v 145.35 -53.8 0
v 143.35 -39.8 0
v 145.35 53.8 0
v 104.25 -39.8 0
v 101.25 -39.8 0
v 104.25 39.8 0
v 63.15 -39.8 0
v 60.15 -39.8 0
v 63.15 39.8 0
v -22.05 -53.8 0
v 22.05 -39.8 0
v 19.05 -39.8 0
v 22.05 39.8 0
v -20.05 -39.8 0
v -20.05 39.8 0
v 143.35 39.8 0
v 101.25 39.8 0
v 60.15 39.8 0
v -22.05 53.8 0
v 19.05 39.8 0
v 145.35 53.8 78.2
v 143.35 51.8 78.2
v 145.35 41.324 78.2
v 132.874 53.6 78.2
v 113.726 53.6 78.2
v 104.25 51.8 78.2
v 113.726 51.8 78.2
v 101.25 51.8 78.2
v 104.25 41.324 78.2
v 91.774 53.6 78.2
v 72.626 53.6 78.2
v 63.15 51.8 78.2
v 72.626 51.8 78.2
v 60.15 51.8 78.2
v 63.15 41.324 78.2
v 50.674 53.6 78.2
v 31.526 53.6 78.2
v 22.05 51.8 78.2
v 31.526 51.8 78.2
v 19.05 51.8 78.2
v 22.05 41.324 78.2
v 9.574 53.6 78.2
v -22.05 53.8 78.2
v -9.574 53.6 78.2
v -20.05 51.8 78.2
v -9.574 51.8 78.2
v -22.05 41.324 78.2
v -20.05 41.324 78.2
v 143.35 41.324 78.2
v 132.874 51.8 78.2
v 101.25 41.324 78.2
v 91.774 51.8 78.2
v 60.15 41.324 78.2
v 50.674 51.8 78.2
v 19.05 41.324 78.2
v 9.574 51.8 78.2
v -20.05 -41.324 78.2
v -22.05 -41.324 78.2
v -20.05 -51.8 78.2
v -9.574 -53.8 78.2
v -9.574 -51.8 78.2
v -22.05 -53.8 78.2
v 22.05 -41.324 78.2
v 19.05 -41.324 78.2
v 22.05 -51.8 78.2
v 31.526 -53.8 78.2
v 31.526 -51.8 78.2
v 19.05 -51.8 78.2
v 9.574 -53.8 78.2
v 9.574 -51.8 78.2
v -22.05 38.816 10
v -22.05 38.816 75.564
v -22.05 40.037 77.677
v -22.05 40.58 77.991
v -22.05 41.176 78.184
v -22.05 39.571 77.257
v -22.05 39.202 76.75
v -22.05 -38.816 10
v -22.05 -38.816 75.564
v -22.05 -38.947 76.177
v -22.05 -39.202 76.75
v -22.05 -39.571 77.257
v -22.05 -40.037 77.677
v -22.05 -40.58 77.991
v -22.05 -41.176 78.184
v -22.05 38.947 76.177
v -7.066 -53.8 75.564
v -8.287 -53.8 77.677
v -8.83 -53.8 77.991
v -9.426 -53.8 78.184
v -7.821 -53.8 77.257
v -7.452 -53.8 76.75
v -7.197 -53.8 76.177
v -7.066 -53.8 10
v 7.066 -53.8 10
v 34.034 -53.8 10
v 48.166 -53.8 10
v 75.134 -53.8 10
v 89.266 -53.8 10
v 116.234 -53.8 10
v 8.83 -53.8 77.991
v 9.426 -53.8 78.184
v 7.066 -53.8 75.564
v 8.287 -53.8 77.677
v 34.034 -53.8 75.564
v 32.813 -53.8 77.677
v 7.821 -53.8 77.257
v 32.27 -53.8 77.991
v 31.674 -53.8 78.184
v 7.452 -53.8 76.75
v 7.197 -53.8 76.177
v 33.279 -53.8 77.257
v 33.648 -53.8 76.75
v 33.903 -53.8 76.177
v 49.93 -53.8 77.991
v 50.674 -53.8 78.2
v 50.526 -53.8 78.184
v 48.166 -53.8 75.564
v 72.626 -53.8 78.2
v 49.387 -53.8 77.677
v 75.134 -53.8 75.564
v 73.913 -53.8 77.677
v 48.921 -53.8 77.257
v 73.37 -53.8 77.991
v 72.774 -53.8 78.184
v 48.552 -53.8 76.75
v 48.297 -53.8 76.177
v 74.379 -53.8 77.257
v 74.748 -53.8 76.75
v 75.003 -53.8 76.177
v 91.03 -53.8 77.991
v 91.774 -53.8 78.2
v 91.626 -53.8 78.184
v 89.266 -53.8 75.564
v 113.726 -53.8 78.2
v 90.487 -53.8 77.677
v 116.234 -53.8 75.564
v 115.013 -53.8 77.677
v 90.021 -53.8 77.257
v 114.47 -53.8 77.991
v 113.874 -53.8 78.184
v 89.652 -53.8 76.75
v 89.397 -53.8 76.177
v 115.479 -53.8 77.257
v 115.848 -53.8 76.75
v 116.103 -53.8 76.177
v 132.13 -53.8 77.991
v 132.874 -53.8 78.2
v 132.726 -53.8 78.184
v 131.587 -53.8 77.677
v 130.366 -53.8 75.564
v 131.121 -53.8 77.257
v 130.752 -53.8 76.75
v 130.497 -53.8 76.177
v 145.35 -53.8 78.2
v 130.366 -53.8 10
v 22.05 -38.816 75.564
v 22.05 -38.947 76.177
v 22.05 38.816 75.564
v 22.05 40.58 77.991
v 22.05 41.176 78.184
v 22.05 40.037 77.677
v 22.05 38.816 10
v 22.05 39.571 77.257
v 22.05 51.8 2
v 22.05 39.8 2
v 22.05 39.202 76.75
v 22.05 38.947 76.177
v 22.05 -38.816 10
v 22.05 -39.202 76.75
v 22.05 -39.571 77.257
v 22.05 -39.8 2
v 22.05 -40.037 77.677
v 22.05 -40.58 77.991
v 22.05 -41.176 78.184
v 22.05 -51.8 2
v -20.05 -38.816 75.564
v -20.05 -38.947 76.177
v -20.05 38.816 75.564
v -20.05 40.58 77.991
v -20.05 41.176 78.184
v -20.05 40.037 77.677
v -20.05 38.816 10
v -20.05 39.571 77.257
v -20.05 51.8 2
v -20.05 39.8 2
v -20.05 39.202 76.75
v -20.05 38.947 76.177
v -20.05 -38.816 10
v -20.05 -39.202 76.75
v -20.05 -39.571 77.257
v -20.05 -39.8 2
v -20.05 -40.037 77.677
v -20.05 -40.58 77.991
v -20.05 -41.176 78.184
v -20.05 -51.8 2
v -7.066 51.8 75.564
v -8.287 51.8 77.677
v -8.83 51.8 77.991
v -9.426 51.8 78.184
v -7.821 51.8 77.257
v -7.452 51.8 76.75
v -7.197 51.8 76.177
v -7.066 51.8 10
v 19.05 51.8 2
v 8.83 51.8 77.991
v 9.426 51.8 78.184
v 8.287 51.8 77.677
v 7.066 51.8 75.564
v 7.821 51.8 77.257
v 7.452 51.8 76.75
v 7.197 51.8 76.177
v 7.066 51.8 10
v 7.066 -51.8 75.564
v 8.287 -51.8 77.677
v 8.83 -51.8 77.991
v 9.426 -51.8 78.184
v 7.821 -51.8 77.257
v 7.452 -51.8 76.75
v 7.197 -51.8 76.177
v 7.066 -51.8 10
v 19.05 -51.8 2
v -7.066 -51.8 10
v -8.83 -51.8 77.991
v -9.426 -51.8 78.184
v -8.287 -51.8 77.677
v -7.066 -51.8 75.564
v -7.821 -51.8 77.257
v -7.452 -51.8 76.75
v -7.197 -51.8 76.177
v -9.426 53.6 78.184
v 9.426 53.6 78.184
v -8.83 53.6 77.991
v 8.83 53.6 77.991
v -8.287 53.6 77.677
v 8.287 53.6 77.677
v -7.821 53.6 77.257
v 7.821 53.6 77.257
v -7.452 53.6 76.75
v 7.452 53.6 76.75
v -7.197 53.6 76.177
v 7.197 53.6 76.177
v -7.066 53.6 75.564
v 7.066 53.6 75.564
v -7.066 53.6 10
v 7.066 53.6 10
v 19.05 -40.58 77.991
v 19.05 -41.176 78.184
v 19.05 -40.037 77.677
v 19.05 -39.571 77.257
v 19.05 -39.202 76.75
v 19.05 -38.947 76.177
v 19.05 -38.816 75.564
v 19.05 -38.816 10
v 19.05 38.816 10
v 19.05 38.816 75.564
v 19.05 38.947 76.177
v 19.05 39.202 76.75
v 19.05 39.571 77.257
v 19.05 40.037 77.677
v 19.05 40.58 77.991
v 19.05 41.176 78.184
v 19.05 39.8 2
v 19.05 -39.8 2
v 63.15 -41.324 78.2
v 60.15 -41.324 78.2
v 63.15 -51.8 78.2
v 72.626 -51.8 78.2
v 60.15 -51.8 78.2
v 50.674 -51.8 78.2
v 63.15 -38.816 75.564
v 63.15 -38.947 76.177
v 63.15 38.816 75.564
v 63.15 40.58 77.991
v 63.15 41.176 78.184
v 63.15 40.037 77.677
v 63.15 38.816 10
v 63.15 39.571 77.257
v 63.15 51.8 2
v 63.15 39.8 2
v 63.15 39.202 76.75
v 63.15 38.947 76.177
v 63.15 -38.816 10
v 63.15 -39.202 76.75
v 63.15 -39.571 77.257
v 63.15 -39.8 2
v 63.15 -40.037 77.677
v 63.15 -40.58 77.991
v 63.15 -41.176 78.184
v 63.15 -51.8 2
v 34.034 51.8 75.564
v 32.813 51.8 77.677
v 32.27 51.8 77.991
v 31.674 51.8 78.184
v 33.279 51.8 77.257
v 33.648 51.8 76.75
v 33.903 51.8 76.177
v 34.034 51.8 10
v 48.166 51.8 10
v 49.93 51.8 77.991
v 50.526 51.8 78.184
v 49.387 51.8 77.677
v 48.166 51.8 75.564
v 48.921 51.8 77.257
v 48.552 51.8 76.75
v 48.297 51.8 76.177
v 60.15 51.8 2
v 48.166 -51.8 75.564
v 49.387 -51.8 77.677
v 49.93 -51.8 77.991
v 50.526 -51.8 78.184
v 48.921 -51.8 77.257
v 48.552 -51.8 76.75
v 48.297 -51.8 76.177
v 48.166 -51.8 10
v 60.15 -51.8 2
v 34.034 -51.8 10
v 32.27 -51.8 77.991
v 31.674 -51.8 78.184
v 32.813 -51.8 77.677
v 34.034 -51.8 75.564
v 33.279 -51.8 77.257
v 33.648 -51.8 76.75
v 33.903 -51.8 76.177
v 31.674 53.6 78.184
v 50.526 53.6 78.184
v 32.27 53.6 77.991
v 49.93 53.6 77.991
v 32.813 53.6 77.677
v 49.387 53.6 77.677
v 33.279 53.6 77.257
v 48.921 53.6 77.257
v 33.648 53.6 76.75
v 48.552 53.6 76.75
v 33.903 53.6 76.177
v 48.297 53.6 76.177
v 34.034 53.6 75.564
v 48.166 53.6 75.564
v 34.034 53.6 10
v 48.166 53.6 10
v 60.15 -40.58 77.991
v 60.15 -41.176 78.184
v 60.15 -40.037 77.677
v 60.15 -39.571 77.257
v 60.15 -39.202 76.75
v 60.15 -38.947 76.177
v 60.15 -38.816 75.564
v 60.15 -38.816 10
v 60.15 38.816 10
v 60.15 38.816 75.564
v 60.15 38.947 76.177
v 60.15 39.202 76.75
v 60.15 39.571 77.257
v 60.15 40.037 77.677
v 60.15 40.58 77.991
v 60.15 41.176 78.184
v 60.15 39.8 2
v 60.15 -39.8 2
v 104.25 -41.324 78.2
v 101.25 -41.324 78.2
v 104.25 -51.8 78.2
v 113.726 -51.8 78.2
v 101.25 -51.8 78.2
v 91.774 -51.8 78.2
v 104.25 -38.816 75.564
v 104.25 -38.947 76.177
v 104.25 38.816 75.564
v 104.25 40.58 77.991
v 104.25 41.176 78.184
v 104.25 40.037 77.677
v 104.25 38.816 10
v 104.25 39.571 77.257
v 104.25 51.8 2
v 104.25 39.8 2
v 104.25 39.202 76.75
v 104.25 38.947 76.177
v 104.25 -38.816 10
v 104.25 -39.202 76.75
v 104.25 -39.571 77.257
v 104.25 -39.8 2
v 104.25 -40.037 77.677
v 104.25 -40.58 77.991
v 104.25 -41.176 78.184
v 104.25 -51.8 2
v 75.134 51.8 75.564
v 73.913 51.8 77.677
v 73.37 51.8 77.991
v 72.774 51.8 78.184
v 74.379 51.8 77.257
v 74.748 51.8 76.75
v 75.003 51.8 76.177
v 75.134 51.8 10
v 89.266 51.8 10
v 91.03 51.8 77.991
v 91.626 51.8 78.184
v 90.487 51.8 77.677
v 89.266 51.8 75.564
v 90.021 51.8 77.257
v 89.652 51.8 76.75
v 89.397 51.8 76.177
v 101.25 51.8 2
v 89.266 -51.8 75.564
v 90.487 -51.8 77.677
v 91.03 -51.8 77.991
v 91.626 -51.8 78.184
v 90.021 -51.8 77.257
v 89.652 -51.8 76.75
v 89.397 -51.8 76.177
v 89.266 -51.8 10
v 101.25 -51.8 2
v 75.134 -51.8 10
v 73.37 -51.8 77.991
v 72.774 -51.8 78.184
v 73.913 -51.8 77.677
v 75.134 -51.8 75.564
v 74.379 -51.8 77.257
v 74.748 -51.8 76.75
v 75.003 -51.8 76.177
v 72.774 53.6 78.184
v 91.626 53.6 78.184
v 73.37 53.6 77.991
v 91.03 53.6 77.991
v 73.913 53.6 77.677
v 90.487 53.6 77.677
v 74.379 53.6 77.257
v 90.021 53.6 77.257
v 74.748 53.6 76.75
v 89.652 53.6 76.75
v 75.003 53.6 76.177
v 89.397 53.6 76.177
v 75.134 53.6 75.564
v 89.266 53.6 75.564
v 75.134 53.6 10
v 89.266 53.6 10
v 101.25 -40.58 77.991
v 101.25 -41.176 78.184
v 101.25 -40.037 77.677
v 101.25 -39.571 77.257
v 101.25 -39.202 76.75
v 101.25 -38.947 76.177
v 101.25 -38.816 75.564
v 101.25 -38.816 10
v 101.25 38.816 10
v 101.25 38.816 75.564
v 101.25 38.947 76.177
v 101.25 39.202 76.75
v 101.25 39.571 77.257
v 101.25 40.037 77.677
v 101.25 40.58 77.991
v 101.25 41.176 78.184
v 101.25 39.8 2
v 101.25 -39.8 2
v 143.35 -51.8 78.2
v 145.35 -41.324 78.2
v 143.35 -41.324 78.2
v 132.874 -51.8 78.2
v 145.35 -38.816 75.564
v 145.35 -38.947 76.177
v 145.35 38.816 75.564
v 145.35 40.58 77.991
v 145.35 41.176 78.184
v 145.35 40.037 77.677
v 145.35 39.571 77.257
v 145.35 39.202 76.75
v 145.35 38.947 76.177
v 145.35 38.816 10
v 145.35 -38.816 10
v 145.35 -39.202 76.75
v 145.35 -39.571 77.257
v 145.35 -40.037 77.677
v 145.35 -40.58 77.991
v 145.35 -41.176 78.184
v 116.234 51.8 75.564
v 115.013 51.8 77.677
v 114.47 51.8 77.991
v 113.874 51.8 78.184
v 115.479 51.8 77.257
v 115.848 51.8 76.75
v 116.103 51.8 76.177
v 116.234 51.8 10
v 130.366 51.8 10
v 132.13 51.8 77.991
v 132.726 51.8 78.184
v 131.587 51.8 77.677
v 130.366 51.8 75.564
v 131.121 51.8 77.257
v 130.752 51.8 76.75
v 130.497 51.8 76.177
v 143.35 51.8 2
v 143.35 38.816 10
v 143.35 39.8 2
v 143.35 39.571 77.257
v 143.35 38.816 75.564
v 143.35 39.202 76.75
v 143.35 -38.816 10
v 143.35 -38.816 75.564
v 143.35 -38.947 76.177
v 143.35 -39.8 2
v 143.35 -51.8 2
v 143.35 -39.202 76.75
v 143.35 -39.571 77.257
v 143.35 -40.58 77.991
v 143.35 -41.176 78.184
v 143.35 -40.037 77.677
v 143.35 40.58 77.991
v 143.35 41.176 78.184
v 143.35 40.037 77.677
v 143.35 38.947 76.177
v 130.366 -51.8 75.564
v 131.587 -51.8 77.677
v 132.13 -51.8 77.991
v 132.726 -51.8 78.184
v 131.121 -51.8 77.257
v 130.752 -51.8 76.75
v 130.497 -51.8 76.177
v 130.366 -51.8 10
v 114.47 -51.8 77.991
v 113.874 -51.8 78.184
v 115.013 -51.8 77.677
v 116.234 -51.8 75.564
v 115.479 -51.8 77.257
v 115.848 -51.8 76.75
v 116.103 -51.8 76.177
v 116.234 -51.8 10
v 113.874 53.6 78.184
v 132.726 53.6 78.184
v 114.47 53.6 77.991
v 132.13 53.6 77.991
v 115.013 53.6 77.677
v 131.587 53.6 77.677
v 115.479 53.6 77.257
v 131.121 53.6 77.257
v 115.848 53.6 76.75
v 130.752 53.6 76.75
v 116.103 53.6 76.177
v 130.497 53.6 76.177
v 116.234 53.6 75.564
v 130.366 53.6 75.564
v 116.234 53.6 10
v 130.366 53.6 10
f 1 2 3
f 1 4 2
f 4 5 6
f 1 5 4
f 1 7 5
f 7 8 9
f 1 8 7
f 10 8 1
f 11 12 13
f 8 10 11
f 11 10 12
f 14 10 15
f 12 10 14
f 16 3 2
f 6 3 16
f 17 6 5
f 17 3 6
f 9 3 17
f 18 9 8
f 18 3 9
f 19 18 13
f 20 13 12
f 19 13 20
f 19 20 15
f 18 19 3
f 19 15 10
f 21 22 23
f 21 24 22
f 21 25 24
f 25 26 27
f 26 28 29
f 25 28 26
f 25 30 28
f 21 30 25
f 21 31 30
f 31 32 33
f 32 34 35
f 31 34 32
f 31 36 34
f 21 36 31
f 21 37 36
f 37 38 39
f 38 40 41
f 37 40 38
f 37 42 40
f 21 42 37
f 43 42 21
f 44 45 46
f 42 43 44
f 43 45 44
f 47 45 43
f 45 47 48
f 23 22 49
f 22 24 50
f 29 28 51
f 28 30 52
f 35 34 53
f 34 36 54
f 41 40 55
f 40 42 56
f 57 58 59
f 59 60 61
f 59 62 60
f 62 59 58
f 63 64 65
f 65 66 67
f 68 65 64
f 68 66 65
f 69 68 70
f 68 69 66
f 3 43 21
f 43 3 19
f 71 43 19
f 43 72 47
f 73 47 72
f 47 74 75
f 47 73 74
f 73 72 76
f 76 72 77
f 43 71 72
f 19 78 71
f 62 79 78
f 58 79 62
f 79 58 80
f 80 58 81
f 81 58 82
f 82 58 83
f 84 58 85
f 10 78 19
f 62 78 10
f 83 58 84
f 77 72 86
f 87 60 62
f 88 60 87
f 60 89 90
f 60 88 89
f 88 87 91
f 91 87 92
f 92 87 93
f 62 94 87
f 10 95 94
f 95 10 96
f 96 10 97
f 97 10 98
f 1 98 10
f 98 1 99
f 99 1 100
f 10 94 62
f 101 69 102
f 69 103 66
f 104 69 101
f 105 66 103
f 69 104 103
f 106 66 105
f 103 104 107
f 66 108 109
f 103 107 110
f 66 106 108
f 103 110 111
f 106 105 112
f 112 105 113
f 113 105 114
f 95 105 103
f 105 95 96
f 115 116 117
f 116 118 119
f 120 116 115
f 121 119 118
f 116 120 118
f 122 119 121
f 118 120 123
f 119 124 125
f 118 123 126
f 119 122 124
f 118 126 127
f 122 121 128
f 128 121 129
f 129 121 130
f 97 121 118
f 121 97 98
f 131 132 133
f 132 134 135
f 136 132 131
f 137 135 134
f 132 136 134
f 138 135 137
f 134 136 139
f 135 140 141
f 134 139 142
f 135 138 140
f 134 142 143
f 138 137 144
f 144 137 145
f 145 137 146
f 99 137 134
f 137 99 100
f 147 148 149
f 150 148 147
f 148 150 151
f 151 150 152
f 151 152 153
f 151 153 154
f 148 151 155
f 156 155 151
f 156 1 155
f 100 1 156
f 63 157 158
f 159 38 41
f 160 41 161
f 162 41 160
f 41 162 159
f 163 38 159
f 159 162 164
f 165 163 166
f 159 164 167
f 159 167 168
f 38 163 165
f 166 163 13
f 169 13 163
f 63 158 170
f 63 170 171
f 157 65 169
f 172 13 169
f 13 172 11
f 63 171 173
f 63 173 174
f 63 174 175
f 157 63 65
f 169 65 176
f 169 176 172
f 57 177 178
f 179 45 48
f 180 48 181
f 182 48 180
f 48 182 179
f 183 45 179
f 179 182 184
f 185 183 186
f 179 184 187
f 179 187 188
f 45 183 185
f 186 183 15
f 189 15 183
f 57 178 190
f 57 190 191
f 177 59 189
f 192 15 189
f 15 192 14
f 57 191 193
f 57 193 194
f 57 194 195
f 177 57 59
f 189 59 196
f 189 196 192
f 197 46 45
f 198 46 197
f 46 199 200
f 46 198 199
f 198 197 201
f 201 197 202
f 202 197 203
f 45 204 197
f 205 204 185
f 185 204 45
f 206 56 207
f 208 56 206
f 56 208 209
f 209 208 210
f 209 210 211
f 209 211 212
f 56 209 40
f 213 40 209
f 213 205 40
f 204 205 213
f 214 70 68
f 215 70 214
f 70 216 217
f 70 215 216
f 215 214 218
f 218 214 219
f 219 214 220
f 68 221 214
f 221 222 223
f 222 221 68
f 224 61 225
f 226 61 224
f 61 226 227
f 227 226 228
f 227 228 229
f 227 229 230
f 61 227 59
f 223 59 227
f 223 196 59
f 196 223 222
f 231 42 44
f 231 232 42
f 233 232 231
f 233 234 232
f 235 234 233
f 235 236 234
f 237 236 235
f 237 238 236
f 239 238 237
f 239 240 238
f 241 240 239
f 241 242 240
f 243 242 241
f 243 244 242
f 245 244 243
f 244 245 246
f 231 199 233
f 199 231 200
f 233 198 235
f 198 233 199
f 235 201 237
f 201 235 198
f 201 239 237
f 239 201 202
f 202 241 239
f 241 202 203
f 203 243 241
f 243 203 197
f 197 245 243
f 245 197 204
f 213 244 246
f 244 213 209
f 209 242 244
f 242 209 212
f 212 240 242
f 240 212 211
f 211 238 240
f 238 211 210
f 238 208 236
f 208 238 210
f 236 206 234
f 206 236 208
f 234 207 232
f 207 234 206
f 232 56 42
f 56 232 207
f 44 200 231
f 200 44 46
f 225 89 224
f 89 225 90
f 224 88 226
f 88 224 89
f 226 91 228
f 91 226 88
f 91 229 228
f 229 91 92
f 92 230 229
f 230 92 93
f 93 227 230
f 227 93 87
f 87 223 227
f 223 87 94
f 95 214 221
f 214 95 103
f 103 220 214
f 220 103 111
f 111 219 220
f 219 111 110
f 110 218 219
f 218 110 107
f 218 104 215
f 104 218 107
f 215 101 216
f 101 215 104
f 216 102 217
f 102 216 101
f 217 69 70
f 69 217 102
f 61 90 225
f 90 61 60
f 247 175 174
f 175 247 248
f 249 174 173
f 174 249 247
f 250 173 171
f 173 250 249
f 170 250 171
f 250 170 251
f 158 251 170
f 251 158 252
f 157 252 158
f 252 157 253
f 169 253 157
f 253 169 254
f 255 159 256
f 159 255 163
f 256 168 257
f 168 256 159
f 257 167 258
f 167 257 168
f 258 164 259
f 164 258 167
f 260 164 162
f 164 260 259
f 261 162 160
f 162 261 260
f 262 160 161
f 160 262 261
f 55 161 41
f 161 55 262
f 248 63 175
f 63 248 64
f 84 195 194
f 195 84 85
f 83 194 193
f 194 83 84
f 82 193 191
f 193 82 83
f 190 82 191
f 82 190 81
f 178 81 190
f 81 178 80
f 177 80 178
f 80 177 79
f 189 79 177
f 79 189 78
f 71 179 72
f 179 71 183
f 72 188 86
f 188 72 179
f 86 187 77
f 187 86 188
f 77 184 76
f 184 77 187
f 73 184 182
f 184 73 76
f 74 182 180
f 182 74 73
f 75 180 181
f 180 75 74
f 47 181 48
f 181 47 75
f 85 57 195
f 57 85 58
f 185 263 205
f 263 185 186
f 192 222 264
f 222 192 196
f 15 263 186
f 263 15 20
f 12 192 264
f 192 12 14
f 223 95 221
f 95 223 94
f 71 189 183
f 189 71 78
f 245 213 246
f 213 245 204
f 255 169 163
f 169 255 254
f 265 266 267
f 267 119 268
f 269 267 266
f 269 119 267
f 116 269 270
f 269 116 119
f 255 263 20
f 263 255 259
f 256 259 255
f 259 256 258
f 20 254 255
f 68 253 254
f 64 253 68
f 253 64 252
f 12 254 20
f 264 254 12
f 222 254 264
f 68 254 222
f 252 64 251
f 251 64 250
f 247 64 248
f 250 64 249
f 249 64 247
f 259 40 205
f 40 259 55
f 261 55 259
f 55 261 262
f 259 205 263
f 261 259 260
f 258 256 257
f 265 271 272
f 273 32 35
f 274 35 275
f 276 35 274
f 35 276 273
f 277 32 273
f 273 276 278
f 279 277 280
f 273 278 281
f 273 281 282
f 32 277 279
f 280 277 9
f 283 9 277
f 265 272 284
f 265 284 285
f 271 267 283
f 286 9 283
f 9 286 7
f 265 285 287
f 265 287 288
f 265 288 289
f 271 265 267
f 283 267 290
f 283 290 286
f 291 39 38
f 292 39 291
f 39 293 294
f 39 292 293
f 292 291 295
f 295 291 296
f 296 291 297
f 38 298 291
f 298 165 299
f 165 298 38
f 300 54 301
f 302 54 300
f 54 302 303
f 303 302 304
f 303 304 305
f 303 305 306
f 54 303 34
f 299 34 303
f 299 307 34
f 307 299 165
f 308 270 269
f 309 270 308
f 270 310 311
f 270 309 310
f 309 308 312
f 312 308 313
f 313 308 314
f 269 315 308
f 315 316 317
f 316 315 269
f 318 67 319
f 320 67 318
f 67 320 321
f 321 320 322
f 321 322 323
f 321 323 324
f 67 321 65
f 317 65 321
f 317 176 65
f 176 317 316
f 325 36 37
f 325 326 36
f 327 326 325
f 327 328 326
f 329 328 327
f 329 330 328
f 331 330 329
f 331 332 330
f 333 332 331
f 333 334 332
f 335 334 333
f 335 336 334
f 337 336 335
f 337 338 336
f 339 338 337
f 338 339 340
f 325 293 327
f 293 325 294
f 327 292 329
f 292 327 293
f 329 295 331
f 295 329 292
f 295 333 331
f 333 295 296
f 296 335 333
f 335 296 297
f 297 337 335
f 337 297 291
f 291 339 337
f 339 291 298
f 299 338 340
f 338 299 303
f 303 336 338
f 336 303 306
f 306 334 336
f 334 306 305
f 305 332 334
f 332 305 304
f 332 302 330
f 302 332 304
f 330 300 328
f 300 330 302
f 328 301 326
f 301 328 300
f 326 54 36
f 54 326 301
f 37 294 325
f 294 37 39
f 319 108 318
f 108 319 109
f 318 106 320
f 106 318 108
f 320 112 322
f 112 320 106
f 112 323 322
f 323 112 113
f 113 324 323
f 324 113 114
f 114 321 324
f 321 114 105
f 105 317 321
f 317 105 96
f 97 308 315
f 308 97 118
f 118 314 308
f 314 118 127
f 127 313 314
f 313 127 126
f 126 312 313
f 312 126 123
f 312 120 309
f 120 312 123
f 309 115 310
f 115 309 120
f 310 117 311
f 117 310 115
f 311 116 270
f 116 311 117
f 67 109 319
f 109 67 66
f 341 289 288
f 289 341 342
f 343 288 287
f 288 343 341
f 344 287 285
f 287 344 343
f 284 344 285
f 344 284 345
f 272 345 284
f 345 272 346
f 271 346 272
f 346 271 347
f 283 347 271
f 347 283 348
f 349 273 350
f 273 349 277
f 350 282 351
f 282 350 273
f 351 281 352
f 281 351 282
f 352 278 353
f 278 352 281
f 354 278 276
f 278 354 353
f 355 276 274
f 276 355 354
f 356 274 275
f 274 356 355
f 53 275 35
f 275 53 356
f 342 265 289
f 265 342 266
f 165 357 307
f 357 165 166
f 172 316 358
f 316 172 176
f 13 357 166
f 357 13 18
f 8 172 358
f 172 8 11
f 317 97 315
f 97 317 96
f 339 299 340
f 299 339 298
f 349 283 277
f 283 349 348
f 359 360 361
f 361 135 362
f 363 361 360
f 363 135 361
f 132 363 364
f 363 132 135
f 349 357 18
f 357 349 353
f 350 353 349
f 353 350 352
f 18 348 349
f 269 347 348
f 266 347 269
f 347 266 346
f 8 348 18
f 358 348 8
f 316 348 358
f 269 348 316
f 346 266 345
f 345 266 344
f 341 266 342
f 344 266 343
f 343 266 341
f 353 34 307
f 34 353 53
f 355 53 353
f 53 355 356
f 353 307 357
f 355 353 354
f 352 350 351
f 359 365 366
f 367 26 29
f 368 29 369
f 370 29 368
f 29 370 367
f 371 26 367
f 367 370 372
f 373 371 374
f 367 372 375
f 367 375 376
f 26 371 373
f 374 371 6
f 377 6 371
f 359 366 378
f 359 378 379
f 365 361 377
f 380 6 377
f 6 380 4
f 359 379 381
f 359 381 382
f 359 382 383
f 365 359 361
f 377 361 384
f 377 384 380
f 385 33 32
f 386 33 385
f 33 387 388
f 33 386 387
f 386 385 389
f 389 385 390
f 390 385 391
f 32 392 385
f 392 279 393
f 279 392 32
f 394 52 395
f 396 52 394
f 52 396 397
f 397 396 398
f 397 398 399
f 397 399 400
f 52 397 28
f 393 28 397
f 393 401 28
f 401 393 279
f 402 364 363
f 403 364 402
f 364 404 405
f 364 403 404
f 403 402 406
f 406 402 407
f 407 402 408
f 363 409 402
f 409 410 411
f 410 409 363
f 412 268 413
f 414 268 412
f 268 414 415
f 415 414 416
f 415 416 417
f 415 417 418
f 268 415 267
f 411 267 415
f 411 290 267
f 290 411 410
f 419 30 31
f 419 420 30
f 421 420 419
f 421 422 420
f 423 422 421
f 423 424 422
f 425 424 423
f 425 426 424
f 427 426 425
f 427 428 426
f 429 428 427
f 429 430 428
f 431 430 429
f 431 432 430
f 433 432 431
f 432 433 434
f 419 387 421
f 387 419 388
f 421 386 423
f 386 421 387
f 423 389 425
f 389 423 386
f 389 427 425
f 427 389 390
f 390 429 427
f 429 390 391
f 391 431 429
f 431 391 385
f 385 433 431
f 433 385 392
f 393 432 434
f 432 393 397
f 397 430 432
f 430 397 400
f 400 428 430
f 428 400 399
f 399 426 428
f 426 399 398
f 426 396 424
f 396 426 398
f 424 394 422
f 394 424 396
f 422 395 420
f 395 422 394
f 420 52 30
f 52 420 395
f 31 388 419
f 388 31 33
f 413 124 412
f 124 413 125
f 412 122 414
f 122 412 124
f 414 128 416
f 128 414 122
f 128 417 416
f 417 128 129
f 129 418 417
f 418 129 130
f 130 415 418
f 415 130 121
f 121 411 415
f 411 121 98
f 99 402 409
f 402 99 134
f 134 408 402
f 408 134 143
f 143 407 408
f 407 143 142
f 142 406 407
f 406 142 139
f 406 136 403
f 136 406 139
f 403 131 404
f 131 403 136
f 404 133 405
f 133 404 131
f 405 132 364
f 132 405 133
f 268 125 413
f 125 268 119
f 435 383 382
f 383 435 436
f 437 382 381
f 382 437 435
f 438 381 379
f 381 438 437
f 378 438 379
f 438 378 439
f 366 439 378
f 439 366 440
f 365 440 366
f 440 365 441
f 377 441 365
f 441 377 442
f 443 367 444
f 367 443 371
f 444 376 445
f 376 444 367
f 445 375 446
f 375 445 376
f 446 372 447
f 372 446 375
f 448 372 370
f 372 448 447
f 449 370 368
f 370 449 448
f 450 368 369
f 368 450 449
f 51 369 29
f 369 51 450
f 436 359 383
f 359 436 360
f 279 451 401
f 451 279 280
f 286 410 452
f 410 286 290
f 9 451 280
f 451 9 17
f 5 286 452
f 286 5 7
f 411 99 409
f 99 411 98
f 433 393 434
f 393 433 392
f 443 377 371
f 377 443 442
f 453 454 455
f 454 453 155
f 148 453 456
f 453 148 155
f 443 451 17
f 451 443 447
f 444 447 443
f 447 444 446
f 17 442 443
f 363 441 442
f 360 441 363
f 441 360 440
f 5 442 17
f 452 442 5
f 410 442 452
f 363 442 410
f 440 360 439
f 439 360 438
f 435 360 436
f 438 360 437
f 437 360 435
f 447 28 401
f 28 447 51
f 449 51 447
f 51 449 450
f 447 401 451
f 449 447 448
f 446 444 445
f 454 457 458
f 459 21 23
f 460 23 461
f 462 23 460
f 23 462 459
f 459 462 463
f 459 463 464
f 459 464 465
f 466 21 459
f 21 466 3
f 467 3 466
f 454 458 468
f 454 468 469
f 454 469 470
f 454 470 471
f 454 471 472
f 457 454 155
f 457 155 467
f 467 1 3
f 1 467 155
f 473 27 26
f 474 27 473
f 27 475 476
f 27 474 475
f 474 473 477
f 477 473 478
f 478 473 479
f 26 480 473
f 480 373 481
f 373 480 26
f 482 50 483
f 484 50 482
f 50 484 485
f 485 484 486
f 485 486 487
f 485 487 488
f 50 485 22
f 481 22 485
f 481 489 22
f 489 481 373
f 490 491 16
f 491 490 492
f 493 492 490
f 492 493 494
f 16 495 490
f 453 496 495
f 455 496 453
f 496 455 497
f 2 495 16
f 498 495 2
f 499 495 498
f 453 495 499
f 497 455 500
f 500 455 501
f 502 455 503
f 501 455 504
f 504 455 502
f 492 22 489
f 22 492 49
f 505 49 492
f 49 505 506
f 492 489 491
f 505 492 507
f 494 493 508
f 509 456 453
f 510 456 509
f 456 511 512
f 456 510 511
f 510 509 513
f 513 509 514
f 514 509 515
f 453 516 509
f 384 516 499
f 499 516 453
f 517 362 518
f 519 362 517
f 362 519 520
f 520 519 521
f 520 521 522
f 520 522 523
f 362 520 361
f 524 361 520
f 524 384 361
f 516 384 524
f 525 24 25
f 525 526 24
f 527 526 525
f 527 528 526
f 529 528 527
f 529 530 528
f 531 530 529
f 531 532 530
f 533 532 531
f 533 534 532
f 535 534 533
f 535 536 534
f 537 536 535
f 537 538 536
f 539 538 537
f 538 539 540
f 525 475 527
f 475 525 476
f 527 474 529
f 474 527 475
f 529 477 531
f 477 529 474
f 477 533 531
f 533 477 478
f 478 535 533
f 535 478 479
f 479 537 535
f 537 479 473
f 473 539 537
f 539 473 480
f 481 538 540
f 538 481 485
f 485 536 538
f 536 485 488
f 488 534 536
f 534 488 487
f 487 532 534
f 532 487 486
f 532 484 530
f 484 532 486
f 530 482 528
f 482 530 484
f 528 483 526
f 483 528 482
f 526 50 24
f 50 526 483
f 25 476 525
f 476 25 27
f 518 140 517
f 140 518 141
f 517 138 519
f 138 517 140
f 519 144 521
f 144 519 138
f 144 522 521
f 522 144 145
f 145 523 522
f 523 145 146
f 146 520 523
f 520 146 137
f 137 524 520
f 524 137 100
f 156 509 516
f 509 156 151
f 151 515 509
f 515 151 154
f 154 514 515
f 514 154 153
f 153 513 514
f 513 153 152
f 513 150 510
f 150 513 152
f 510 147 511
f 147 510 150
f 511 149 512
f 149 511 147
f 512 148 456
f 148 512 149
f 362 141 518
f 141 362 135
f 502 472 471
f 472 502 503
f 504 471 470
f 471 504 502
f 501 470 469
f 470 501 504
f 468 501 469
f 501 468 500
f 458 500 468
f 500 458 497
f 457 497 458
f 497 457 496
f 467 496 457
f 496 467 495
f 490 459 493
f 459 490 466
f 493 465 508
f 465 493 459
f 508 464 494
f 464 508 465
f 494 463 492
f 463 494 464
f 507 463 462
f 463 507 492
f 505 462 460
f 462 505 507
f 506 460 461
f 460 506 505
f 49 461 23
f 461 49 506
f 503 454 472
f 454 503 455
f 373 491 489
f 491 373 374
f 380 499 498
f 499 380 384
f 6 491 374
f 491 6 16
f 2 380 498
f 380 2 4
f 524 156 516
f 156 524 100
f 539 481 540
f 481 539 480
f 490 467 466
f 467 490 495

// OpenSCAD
// file: ../common/roundedrectdiff.scad
// This creates a square with inverted rounded edges
// usually for subtracting from something else to give that
// object some rounded corners
module rounded_subtraction_square(height, width, radius, segments = 30)
{
    union()
    {
        // base
        square(size = [ height, width ], center = true);

        // right (y+)
        intersection()
        {

            translate([ 0, (width / 2) + (radius / 2), 0 ])
            {
                square(size = [ height, radius ], center = true);
            }

            difference()
            {
                translate([ 0, (width / 2) + radius, 0 ])
                {
                    square(size = [ height, radius * 2 ], center = true);
                }
                hull()
                {
                    translate([ (height / 2) - radius, (width / 2) + radius, 0 ])
                    {
                        circle(r = radius, $fn = segments);
                    }
                    translate([ -((height / 2) - radius), (width / 2) + radius, 0 ])
                    {
                        circle(r = radius, $fn = segments);
                    }
                }
            }
        }

        // left (y-)
        intersection()
        {

            translate([ 0, -((width / 2) + (radius / 2)), 0 ])
            {
                square(size = [ height, radius ], center = true);
            }

            difference()
            {
                translate([ 0, -((width / 2) + radius), 0 ])
                {
                    square(size = [ height, radius * 2 ], center = true);
                }
                hull()
                {
                    translate([ (height / 2) - radius, -((width / 2) + radius), 0 ])
                    {
                        circle(r = radius, $fn = segments);
                    }
                    translate([ -((height / 2) - radius), -((width / 2) + radius), 0 ])
                    {
                        circle(r = radius, $fn = segments);
                    }
                }
            }
        }
    }
}

module rounded_subtraction_square_top(height, width, radius, segments = 30)
{
    union()
    {
        // base
        square(size = [ height, width ], center = true);

        // right (y+)
        intersection()
        {

            translate([ 0, (width / 2) + (radius / 2), 0 ])
            {
                square(size = [ height, radius ], center = true);
            }

            difference()
            {
                translate([ 0, (width / 2) + radius, 0 ])
                {
                    square(size = [ height, radius * 2 ], center = true);
                }
                hull()
                {
                    translate([ (height / 2) - radius, (width / 2) + radius, 0 ])
                    {
                        circle(r = radius, $fn = segments);
                    }
                    translate([ -((height / 2) - radius) * 2, (width / 2) + radius, 0 ])
                    {
                        circle(r = radius, $fn = segments);
                    }
                }
            }
        }

        // left (y-)
        intersection()
        {

            translate([ 0, -((width / 2) + (radius / 2)), 0 ])
            {
                square(size = [ height, radius ], center = true);
            }

            difference()
            {
                translate([ 0, -((width / 2) + radius), 0 ])
                {
                    square(size = [ height, radius * 2 ], center = true);
                }
                hull()
                {
                    translate([ (height / 2) - radius, -((width / 2) + radius), 0 ])
                    {
                        circle(r = radius, $fn = segments);
                    }
                    translate([ -((height / 2) - radius) * 2, -((width / 2) + radius), 0 ])
                    {
                        circle(r = radius, $fn = segments);
                    }
                }
            }
        }
    }
}

rounded_subtraction_square_top(20, 10, 3);
// main file
use <../common/roundedrectdiff.scad>;

// Version 2
// Printed Version (2022-08-03) had margin = 1
inch = 25.4;
in4 = 101.6;
in6 = 152.4;
// width and height from top
// width = x, height = y
width = inch * 1.5;
height = in4;
// depth = tallness
depth = 3 * inch;
margin = 2;
buffer = 5;
thickness = 0.4 * buffer;
// single corner width, x2 is what's taken out each side
corner_width = 12;
corner_width_total = corner_width * 2;
fence_height = 10;

// 4 in = 101.6mm
// 6in = 152.4mm

module bin(x, y, z, fence_height, margin, corner_width, buffer, nozzle_width = 0.4)
{
    thickness = nozzle_width * buffer;
    union()
    {
        difference()
        {
            linear_extrude(z + thickness)
            {
                difference()
                {
                    offset(delta = thickness)
                    {
                        square([ x + margin, y + margin ], center = true);
                    }
                    square([ x + margin, y + margin ], center = true);
                }
            }

            color()
            {
                translate([ 0, (y / 2) + (thickness * 1.4), (thickness / 2) + (z / 2) ])
                {
                    rotate([ 90, 90, 0 ])
                    {
                        linear_extrude(thickness * 3)
                        {
                            {
                                rounded_subtraction_square(height = thickness + z + 0.1, width = x - corner_width_total,
                                                           radius = 3);
                            }
                        }
                    }
                }
            }
            color()
            {
                translate([ 0, -((y / 2)), (thickness / 2) + (z / 2) ])
                {
                    rotate([ 90, 90, 0 ])
                    {
                        linear_extrude(thickness * 3)
                        {
                            {
                                rounded_subtraction_square(height = thickness + z + 0.1, width = x - corner_width_total,
                                                           radius = 3);
                            }
                        }
                    }
                }
            }
            color()
            {
                translate([ (x / 2) - (thickness), 0, (thickness / 2) + (z / 2) ])
                {
                    rotate([ 90, 90, 90 ])
                    {
                        linear_extrude(thickness * 3)
                        {
                            {
                                rounded_subtraction_square(height = thickness + z + 0.1, width = y - corner_width_total,
                                                           radius = 3);
                            }
                        }
                    }
                }
            }
            color()
            {
                translate([ -((x / 2) + (thickness*2)), 0, (thickness / 2) + (z / 2) ])
                {
                    rotate([ 90, 90, 90 ])
                    {
                        linear_extrude(thickness * 3)
                        {
                            {
                                rounded_subtraction_square(height = thickness + z + 0.1, width = y - corner_width_total,
                                                           radius = 3);
                            }
                        }
                    }
                }
            }
        }

        linear_extrude(thickness)
        {
            difference() {
            square([ x + margin, y + margin ], center = true);
            square([ x + margin, y + margin - corner_width * 2 ], center = true);

            }
        }

        linear_extrude(fence_height)
        {
            difference()
            {
                offset(delta = thickness)
                {
                    square([ x + margin, y + margin ], center = true);
                }
                square([ x + margin, y + margin ], center = true);
            }
        }
    }
}

union()
{
    bin(width, height, depth, fence_height, margin, corner_width, buffer);
    translate([ width + (thickness * 1.5), 0, 0 ])
    {
        bin(width, height, depth, fence_height, margin, corner_width, buffer);
    }
    translate([ 2 * (width + (thickness * 1.5)), 0, 0 ])
    {
        bin(width, height, depth, fence_height, margin, corner_width, buffer);
    }
    translate([ 3 * (width + (thickness * 1.5)), 0, 0 ])
    {
        bin(width, height, depth, fence_height, margin, corner_width, buffer);
    }
}
